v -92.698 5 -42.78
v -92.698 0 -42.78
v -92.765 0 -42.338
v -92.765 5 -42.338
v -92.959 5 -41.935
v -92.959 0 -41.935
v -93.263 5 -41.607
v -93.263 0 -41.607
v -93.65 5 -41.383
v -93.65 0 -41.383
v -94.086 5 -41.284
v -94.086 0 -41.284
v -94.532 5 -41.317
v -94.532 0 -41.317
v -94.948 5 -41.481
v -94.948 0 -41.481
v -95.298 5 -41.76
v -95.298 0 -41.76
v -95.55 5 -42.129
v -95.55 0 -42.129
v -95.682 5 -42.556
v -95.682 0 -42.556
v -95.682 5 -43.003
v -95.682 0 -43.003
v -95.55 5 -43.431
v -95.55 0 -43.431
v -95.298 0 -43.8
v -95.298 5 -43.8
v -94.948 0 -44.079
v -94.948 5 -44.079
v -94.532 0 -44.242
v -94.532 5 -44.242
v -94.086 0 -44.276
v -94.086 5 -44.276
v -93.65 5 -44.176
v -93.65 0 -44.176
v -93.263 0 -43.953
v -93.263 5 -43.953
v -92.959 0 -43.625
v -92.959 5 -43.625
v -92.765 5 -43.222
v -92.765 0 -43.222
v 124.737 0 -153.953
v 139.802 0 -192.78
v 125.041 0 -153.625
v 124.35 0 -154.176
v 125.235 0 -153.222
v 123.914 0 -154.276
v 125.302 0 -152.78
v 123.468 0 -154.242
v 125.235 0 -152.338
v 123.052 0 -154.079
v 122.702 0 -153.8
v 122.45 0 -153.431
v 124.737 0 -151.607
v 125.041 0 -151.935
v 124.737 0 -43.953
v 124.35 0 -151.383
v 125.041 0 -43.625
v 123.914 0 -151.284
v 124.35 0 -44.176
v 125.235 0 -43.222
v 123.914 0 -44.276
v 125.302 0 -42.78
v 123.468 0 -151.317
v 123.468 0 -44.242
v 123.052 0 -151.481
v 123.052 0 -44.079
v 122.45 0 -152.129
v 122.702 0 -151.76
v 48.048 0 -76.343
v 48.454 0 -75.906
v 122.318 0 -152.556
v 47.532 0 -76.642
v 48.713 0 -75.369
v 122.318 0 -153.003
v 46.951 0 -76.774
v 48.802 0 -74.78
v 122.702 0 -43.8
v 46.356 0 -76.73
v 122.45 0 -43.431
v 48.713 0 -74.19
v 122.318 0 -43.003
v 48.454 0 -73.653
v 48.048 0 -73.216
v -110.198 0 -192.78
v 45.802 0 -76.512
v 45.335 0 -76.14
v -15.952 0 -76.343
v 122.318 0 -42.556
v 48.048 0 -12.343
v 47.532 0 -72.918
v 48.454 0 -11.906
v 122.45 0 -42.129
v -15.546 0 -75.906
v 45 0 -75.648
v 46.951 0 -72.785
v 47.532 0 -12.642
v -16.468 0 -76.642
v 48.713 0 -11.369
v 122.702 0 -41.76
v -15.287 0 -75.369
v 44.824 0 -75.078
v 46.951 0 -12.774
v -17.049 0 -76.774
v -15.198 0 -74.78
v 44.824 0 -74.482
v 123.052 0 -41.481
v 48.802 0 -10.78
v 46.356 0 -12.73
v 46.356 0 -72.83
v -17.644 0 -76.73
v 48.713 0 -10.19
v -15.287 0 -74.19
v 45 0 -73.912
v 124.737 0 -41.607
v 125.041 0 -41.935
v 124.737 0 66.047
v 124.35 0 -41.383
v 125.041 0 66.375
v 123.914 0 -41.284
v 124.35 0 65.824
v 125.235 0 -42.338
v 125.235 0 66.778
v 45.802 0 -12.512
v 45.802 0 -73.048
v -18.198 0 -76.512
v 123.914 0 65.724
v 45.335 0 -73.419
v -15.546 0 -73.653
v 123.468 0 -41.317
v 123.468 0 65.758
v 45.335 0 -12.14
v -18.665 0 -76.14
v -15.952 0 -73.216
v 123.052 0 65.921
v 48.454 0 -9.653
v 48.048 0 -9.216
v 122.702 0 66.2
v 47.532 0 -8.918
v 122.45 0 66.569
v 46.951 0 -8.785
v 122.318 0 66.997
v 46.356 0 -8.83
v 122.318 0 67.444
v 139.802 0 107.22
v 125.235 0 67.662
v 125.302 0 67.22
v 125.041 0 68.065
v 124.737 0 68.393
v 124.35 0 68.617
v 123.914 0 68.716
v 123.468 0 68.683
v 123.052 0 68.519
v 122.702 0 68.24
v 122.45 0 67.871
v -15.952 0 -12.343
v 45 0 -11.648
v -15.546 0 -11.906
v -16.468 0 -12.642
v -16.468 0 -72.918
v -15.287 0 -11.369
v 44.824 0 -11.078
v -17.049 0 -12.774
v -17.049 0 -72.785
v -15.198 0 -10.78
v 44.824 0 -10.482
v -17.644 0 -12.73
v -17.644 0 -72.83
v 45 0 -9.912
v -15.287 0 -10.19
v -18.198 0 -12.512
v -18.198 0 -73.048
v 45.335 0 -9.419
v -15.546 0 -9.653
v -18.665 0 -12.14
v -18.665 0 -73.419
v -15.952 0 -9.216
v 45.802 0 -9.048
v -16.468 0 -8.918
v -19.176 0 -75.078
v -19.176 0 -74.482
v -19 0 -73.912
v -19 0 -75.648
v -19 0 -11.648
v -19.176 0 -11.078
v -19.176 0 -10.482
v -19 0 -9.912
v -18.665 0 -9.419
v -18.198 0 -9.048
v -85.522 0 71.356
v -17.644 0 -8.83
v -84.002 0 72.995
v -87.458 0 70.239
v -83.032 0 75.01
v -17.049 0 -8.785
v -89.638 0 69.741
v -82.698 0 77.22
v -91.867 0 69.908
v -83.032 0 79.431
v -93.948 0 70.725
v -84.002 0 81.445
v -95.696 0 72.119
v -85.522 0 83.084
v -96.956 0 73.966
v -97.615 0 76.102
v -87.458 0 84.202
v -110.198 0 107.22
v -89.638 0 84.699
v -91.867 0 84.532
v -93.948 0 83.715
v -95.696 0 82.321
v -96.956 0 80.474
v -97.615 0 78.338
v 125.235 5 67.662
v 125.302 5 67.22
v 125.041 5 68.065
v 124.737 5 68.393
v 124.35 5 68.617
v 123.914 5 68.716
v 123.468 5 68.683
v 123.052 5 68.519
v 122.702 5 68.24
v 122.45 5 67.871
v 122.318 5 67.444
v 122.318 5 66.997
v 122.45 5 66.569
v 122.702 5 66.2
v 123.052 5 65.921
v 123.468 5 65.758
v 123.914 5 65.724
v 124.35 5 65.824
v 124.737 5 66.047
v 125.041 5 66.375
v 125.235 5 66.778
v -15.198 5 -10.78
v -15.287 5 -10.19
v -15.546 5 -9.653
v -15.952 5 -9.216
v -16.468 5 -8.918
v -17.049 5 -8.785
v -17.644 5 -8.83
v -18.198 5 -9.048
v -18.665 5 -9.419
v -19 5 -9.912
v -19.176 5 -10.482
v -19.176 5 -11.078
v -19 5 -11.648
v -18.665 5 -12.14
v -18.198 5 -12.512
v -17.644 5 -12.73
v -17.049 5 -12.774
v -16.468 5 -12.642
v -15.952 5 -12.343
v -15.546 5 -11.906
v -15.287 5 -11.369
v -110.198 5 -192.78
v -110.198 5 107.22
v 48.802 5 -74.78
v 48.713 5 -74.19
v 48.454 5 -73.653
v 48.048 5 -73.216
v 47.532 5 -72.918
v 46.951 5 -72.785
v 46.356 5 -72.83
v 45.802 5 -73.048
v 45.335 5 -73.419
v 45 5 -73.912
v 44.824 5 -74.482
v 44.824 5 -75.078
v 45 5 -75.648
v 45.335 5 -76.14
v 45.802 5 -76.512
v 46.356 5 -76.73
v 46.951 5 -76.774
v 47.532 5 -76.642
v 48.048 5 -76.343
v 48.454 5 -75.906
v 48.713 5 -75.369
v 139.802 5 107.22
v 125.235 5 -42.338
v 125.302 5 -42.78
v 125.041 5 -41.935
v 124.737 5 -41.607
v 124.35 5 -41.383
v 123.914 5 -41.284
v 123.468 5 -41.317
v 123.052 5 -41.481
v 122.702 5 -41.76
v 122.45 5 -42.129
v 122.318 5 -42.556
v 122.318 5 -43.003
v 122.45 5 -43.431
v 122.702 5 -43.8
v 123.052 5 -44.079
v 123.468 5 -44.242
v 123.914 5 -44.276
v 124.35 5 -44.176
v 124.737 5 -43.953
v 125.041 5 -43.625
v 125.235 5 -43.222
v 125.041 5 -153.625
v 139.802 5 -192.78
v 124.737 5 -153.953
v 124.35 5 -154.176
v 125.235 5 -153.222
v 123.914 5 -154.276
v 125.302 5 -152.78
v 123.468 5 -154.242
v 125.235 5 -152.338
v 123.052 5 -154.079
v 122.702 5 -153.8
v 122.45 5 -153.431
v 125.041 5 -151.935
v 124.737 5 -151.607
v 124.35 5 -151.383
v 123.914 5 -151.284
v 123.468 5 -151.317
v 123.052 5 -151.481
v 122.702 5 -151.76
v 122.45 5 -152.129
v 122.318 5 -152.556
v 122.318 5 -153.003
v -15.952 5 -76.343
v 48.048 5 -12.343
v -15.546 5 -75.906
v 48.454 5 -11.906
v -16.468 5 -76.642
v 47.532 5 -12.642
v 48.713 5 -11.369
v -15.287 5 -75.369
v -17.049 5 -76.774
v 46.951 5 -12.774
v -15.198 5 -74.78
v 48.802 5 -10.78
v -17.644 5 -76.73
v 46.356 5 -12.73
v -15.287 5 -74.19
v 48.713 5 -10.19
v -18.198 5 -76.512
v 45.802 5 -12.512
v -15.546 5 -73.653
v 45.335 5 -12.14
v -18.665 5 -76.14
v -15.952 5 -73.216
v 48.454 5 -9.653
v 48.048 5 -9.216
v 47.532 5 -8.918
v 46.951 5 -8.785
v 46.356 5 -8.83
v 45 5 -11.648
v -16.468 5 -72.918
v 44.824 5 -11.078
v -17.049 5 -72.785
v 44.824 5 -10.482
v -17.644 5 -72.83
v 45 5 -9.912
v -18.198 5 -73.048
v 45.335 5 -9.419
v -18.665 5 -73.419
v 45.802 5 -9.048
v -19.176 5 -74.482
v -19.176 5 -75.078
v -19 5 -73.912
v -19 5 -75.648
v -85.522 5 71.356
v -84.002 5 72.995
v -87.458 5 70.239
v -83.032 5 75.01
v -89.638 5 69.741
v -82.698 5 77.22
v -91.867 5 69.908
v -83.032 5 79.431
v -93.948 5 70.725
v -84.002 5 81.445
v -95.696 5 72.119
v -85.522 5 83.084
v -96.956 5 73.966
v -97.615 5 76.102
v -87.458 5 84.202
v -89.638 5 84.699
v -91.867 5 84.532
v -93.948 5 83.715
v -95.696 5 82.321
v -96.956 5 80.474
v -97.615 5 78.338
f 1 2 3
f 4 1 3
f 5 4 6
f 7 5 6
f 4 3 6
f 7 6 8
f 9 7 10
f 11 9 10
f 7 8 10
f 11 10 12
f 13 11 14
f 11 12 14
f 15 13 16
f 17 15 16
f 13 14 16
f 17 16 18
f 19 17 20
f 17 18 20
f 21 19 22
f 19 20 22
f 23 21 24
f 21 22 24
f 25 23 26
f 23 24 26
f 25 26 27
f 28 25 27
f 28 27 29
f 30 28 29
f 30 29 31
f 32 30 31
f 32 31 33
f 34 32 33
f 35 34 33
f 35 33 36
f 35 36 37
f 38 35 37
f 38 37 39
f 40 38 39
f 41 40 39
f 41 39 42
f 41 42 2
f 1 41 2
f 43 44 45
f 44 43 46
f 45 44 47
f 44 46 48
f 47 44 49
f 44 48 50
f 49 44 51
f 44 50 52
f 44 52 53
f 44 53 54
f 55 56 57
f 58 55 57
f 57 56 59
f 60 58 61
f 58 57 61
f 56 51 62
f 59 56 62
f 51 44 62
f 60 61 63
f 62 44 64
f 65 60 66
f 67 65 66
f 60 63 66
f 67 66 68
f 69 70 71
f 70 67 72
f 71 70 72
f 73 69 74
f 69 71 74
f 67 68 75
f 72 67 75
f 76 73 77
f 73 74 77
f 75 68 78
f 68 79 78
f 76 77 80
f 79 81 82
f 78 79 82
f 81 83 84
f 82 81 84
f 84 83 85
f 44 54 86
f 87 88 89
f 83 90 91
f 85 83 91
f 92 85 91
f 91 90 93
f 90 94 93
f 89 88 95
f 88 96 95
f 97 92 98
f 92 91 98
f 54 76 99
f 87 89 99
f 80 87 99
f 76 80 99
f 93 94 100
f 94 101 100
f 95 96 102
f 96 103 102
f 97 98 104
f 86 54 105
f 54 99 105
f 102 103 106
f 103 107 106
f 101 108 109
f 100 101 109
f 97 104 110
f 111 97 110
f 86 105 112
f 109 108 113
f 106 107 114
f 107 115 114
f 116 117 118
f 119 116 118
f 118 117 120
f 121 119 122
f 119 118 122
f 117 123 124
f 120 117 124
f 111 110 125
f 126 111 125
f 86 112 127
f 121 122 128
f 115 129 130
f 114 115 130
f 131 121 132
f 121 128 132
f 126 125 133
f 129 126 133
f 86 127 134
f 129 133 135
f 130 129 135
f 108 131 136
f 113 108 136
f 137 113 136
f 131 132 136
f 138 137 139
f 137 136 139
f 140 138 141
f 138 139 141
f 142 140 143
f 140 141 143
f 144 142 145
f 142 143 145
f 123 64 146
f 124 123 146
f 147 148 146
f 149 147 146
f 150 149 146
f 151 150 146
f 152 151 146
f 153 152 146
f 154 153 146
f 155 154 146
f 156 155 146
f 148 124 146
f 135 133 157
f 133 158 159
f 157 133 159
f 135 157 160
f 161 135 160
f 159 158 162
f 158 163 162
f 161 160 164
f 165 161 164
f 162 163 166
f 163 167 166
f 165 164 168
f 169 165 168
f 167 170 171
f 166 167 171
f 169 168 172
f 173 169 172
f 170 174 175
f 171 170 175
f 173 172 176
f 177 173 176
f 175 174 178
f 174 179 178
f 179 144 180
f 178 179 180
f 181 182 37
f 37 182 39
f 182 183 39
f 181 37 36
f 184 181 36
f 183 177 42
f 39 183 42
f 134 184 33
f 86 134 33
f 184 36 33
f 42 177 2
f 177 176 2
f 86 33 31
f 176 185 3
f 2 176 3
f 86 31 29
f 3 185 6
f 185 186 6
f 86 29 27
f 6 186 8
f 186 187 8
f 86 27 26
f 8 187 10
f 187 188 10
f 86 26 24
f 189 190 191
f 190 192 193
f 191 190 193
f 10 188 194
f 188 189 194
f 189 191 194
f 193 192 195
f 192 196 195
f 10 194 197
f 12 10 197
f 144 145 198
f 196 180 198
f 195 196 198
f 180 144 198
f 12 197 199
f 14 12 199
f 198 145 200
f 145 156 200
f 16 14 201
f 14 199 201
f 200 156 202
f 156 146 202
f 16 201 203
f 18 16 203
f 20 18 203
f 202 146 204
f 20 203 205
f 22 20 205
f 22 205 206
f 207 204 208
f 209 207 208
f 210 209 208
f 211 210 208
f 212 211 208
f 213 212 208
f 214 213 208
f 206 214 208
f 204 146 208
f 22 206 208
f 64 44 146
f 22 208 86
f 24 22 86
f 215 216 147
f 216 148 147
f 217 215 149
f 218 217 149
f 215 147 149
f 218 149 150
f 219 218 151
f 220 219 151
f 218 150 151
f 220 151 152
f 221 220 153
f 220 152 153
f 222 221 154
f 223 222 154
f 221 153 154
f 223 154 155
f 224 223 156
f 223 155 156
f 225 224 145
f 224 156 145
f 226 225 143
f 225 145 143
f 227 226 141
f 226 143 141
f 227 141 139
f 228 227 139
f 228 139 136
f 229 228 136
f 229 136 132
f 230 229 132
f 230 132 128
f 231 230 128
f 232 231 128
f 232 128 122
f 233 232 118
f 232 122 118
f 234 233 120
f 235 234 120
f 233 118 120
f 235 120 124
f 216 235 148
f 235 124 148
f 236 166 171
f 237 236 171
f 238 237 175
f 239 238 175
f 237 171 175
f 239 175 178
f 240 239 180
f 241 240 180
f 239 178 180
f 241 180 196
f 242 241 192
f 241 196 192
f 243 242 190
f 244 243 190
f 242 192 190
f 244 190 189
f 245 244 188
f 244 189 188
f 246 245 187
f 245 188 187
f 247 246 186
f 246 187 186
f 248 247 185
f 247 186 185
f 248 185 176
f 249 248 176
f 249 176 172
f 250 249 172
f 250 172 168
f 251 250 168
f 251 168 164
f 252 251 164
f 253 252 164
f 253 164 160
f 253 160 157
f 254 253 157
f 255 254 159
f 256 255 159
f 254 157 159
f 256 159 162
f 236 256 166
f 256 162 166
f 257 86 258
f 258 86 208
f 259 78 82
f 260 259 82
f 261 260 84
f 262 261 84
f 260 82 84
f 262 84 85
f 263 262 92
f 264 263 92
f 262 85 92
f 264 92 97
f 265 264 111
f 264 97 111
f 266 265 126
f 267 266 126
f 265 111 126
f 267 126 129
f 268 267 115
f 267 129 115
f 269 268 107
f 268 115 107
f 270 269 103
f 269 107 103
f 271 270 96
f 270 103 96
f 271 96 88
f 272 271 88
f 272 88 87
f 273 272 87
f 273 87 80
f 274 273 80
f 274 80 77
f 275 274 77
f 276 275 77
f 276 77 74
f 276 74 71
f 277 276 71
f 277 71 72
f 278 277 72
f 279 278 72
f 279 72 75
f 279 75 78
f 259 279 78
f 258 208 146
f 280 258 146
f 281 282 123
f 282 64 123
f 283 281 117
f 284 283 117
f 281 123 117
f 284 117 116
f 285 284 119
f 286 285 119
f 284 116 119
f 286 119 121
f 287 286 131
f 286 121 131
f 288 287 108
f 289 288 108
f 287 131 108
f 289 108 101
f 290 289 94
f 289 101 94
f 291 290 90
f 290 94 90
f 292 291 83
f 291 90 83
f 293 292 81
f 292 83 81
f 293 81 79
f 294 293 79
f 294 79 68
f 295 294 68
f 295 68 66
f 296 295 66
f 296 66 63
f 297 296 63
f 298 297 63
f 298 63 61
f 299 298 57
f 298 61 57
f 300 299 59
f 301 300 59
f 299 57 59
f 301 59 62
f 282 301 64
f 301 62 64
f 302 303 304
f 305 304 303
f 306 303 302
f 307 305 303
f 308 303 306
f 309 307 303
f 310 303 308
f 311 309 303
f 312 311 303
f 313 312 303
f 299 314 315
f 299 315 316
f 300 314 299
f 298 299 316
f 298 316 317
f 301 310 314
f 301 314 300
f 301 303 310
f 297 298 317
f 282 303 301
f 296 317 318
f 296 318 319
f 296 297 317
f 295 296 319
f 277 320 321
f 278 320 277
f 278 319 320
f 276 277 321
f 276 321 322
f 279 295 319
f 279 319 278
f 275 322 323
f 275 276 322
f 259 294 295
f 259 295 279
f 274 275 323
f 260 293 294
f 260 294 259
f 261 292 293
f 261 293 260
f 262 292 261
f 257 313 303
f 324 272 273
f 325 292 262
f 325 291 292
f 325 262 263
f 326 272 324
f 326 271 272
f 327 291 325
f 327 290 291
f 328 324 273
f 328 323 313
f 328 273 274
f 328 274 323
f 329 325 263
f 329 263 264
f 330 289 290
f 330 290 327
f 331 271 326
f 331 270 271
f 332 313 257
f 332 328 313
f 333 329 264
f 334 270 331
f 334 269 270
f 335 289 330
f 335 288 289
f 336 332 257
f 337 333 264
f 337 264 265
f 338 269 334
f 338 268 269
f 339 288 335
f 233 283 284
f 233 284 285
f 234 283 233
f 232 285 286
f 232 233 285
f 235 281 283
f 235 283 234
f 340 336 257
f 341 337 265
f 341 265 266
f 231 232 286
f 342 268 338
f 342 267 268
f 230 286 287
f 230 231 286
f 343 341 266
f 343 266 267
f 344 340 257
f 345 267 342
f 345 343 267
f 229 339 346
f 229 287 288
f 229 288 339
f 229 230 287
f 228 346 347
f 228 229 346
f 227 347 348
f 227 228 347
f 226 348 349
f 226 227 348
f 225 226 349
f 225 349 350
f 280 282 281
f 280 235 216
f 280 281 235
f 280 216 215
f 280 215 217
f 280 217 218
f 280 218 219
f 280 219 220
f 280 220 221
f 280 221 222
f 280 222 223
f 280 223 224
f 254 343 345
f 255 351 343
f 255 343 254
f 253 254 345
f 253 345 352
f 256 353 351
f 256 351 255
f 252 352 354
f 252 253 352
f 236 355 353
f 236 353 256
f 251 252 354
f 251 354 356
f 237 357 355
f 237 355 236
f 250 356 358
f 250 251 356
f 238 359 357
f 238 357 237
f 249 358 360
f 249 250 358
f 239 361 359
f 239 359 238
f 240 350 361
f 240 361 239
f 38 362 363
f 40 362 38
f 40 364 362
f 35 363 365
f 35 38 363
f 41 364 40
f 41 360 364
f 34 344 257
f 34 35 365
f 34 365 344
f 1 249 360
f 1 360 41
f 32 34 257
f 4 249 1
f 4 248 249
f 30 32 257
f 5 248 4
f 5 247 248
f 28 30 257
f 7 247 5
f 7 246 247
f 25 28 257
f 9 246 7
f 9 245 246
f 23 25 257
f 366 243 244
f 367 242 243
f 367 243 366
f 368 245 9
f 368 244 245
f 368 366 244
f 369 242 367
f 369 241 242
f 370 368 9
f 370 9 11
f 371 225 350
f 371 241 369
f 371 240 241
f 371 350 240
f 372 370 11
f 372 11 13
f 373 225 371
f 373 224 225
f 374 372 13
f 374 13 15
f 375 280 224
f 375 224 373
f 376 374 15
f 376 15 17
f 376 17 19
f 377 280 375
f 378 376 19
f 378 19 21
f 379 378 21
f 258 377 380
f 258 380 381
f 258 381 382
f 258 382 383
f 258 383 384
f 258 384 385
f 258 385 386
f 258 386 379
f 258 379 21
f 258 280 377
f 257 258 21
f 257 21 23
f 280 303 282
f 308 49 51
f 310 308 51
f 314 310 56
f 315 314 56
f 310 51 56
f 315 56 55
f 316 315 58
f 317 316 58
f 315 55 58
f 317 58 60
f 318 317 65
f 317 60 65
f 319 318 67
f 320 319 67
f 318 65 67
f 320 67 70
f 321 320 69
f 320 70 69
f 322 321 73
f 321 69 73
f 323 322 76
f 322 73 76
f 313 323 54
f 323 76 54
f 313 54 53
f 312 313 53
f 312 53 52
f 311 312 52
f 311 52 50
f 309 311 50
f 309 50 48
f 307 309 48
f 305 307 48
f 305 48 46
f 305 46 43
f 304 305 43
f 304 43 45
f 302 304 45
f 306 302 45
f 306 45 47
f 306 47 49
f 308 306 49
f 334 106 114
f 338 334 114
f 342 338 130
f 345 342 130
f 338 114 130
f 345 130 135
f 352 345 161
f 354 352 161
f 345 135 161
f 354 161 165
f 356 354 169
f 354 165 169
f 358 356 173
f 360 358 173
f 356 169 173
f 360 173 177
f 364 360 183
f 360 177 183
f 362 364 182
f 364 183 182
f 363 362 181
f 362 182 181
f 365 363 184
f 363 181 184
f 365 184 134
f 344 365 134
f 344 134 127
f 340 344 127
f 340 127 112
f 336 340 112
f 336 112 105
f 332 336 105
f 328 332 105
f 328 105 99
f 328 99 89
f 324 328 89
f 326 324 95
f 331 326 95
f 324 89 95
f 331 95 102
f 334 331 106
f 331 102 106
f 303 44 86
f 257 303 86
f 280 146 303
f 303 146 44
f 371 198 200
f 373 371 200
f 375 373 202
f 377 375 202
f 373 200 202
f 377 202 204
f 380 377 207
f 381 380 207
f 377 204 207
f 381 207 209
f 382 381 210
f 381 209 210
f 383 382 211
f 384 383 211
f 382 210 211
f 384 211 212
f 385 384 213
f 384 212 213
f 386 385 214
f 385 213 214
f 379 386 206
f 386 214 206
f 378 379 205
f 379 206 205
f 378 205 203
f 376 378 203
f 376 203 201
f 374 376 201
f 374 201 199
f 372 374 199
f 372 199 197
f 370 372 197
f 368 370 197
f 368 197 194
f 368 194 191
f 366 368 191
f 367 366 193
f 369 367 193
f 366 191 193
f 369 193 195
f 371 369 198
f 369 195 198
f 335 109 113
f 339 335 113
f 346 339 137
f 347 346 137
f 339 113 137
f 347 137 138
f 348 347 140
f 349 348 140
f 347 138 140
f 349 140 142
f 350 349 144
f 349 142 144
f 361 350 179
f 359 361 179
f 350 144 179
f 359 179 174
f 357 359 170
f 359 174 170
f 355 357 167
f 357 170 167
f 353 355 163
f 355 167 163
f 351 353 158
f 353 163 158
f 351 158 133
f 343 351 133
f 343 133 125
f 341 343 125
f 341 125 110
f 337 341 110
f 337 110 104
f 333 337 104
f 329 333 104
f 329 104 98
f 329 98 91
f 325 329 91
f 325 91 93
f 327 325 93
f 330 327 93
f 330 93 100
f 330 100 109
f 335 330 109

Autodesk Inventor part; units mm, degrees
ref_plane "YZ Plane" through (0, 0, 0) normal (1, 0, 0) x (0, 1, 0)
ref_plane "XZ Plane" through (0, 0, 0) normal (0, 1, 0) x (-1, 0, 0)
ref_plane "XY Plane" through (0, 0, 0) normal (0, 0, 1) x (1, 0, 0)
sketch "Esquisse1" plane through (0, 0, 0) normal (0, 1, 0) x (-1, 0, 0)
  line L0 (110.1985, 107.2202) -> (-139.8015, 107.2202)
  line L1 (-139.8015, 107.2202) -> (-139.8015, -192.7798)
  line L2 (-139.8015, -192.7798) -> (110.1985, -192.7798)
  line L3 (110.1985, -192.7798) -> (110.1985, 107.2202)
  point P0 (0, 0)
  dimension "d0" = 300
  dimension "d1" = 250
extrude "Extrusion1" add sketch "Esquisse1" along normal blind 5
sketch "Esquisse2" plane through (0, 0, 0) normal (0, -1, 0) x (1, 0, 0)
  circle A0 centre (-94.1985, -42.7798) radius 1.5
  circle A1 centre (123.8015, -42.7798) radius 1.5
  circle A2 centre (123.8015, 67.2202) radius 1.5
  circle A3 centre (123.8015, -152.7798) radius 1.5
  line L0 (-110.1985, -192.7798) -> (-110.1985, 107.2202) projected
  line L1 (139.8015, -192.7798) -> (-110.1985, -192.7798) projected
  line L2 (139.8015, 107.2202) -> (139.8015, -192.7798) projected
  line L3 (-110.1985, 107.2202) -> (139.8015, 107.2202) projected
  point P0 (0, 0)
  dimension "d4" = 16
  dimension "d5" = 150
  dimension "d6" = 16
  dimension "d7" = 16
  dimension "d8" = 16
  dimension "d9" = 40
  dimension "d10" = 150
  dimension "d11" = 40
extrude "Extrusion2" cut sketch "Esquisse2" against normal through all contours A0 | A1 | A2 | A3
sketch "Esquisse6" plane through (0, 0, 0) normal (0, -1, 0) x (1, 0, 0)
  circle A0 centre (-90.1985, 77.2202) radius 7.5
  line L0 (-110.1985, 107.2202) -> (139.8015, 107.2202) projected
  line L1 (-110.1985, -192.7798) -> (-110.1985, 107.2202) projected
  point P0 (0, 0)
  dimension "d32" = 15
  dimension "d33" = 30
  dimension "d34" = 20
extrude "Extrusion6" cut sketch "Esquisse6" against normal up to next
sketch "Esquisse7" plane through (0, 0, 0) normal (0, -1, 0) x (1, 0, 0)
  circle A0 centre (-17.1985, -10.7798) radius 2
  circle A1 centre (-17.1985, -74.7798) radius 2
  circle A2 centre (46.8015, -74.7798) radius 2
  circle A3 centre (46.8015, -10.7798) radius 2
  point P0 (0, 0)
extrude "Extrusion7" cut sketch "Esquisse7" against normal up to next
properties part number "toit"
